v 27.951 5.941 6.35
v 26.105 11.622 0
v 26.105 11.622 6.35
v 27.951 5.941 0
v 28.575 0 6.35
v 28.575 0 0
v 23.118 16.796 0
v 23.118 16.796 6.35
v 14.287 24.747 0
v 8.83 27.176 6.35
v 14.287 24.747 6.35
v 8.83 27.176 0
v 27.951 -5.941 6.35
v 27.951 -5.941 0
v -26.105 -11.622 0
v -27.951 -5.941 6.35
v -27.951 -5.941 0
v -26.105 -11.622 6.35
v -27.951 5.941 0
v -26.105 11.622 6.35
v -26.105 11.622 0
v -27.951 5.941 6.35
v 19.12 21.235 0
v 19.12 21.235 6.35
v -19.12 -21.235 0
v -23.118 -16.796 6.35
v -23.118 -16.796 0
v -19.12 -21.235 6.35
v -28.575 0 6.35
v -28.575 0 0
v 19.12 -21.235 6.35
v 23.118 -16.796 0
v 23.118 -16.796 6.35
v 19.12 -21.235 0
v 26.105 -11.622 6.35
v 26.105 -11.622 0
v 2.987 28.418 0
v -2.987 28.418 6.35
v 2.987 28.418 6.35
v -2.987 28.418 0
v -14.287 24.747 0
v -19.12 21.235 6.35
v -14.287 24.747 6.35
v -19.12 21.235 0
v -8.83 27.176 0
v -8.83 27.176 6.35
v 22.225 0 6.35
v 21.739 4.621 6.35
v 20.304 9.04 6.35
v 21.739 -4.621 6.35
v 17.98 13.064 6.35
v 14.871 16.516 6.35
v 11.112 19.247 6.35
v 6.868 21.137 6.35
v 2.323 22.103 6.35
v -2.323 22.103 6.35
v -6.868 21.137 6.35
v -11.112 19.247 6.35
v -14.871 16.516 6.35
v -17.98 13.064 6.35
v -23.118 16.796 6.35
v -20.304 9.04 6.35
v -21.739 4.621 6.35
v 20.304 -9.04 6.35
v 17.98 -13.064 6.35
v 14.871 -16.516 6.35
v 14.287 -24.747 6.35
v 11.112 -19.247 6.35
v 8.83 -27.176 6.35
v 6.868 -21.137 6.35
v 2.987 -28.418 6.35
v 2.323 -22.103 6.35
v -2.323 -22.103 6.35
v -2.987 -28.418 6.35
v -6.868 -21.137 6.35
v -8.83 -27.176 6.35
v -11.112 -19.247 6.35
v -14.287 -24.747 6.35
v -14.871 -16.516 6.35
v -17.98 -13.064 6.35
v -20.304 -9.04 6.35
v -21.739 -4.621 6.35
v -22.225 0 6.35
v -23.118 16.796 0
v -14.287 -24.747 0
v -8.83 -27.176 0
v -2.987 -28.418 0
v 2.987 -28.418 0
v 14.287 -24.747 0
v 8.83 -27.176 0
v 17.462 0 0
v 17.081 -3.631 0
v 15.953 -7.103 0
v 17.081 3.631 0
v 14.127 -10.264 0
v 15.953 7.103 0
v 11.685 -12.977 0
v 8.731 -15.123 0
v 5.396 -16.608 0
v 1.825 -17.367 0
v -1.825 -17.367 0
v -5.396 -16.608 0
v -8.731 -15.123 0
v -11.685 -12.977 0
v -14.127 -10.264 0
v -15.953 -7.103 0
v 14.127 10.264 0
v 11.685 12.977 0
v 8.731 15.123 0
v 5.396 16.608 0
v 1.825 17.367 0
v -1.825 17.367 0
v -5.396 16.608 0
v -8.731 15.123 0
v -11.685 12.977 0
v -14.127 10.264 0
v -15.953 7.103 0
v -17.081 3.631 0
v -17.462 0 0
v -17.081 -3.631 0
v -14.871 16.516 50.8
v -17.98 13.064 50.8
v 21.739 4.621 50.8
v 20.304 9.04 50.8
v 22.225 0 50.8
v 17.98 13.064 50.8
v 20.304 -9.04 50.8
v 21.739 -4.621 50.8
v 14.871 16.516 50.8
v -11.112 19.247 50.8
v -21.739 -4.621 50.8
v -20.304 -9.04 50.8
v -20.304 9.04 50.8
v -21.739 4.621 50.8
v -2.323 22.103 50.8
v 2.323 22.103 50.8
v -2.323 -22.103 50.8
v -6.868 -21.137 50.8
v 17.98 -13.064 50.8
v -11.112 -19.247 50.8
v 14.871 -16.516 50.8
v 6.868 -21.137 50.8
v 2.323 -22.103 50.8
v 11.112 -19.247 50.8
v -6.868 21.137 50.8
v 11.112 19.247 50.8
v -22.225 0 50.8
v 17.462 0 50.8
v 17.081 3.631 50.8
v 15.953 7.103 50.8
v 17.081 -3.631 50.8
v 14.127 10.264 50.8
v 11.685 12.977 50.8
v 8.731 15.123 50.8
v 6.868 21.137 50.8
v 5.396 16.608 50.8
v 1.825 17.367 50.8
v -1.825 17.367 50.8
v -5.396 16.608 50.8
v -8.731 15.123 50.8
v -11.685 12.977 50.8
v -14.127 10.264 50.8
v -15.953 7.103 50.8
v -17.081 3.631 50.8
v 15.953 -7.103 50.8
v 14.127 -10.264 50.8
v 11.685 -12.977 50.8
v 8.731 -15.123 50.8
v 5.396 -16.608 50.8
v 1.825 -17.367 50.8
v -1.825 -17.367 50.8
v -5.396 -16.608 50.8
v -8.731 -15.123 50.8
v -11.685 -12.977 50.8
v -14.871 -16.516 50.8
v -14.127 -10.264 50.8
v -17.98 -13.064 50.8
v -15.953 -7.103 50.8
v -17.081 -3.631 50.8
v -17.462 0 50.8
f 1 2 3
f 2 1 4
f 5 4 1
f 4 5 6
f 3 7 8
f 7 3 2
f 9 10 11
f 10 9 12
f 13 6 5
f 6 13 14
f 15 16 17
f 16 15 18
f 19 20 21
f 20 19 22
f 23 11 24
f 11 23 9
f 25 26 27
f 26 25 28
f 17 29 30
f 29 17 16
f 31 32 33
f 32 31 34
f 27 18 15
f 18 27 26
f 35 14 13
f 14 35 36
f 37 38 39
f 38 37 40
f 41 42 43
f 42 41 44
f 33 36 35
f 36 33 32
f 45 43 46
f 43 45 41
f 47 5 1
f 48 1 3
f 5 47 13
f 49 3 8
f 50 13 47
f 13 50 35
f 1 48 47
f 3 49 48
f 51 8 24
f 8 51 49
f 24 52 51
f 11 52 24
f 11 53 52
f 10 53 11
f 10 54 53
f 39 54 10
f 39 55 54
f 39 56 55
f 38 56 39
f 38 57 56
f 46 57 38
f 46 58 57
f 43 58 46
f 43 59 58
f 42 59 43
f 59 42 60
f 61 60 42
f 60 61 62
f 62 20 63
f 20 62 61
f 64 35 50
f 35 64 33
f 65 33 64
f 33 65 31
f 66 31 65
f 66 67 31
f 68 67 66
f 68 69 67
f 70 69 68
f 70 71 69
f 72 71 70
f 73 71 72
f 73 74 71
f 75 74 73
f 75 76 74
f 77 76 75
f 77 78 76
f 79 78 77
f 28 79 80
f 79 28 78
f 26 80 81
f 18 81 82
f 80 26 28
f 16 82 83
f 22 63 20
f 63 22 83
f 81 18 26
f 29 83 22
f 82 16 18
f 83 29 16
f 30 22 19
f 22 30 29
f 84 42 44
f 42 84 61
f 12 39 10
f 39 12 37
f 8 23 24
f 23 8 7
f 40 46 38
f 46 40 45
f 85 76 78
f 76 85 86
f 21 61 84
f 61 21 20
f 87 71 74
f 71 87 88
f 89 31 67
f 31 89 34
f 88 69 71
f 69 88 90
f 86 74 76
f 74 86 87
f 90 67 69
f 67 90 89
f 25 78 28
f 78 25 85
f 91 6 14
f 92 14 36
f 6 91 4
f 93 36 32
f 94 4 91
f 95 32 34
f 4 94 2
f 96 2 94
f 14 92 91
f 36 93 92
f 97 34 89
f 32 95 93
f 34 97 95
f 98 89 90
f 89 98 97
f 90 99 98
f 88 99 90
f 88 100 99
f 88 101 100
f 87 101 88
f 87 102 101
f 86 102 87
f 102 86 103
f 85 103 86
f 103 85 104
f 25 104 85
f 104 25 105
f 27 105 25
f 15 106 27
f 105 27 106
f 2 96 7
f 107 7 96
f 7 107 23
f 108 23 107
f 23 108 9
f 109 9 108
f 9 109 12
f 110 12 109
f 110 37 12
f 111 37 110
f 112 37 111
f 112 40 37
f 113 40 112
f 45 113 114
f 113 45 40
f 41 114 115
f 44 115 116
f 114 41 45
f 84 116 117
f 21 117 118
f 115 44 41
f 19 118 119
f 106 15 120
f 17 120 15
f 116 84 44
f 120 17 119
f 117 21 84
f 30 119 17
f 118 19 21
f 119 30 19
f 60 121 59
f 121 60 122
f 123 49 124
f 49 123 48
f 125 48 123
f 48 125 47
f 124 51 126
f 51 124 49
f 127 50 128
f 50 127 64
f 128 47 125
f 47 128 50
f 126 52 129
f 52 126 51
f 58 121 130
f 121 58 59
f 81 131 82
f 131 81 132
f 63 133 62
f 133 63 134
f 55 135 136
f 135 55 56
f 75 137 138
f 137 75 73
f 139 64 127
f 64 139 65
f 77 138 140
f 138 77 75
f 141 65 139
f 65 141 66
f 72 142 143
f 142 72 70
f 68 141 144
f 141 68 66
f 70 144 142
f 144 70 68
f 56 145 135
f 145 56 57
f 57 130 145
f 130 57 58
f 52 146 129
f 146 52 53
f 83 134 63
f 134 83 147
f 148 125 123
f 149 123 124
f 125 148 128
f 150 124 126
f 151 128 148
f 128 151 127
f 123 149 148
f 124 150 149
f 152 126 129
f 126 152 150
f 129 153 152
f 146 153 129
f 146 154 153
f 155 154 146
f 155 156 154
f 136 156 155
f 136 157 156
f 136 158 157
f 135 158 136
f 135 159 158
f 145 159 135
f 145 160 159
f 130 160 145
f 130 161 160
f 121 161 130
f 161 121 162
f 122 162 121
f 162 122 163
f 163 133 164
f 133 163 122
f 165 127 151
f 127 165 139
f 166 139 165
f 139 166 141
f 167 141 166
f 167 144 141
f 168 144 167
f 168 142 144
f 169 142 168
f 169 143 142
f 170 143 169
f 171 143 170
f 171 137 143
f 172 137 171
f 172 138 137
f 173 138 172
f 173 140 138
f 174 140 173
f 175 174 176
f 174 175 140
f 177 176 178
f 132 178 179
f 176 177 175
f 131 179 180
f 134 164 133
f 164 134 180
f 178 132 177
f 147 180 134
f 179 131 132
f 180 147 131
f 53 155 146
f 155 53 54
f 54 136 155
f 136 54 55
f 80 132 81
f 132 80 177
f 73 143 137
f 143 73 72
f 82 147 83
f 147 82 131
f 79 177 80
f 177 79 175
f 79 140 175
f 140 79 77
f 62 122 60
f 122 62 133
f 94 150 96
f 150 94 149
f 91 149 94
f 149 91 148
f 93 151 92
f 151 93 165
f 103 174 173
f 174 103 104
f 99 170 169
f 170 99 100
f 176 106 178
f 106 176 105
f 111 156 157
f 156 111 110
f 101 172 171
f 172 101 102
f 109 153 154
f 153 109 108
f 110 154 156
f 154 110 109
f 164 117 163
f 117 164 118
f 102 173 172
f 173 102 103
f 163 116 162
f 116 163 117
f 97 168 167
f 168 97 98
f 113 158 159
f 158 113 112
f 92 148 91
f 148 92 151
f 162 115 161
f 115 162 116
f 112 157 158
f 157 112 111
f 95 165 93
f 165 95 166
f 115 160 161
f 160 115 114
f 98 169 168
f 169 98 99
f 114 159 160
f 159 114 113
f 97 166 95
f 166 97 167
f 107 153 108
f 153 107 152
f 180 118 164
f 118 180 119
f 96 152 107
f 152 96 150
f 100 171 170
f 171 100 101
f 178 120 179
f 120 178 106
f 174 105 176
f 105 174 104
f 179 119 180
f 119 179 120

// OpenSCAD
// --- Configuration ---

// Total height of the entire part is 2 inches
total_height_in = 2;

// SET YOUR LIP HEIGHT HERE (in inches)
// This is the thickness of the 2 1/4" diameter lip.
lip_height_in = 1/4;   // Example: 1/4 inch thick lip

// Diameters from your drawing
lip_dia_in   = 2 + 1/4;  // 2.25"
main_dia_in  = 1 + 3/4;  // 1.75"
inner_dia_in = 1 + 3/8;  // 1.375" (the hole)

// Conversion factor
inch_to_mm = 25.4;

// --- Calculations (convert inches to mm) ---

// Calculate main height
main_height_in = total_height_in - lip_height_in;

if (main_height_in <= 0) {
    echo("Error: Lip height is >= total height!");
}

// Convert all dimensions to mm
main_height_mm = main_height_in * inch_to_mm;
lip_height_mm  = lip_height_in * inch_to_mm;
lip_dia_mm     = lip_dia_in * inch_to_mm;
main_dia_mm    = main_dia_in * inch_to_mm;
inner_dia_mm   = inner_dia_in * inch_to_mm;
total_height_mm = total_height_in * inch_to_mm;

// --- 3D Model ---

difference() {
    
    // 1. Combine the solid parts (lip + main body)
    union() {
        
        // The Lip (sits on the "floor" at Z=0)
        // We do NOT use center=true here.
        cylinder(h = lip_height_mm, d = lip_dia_mm);
        
        // The Main Body (sits on top of the lip)
        // We translate it up by the lip's height.
        translate([0, 0, lip_height_mm]) {
            cylinder(h = main_height_mm, d = main_dia_mm);
        }
    }
    
    // 2. Subtract the hole all the way through
    // We start the hole 1mm *below* the part (z=-1)
    // and make it 2mm *taller* than the total height
    // to guarantee it cuts cleanly through the top and bottom.
    translate([0, 0, -1]) {
        cylinder(h = total_height_mm + 2, d = inner_dia_mm);
    }
}
